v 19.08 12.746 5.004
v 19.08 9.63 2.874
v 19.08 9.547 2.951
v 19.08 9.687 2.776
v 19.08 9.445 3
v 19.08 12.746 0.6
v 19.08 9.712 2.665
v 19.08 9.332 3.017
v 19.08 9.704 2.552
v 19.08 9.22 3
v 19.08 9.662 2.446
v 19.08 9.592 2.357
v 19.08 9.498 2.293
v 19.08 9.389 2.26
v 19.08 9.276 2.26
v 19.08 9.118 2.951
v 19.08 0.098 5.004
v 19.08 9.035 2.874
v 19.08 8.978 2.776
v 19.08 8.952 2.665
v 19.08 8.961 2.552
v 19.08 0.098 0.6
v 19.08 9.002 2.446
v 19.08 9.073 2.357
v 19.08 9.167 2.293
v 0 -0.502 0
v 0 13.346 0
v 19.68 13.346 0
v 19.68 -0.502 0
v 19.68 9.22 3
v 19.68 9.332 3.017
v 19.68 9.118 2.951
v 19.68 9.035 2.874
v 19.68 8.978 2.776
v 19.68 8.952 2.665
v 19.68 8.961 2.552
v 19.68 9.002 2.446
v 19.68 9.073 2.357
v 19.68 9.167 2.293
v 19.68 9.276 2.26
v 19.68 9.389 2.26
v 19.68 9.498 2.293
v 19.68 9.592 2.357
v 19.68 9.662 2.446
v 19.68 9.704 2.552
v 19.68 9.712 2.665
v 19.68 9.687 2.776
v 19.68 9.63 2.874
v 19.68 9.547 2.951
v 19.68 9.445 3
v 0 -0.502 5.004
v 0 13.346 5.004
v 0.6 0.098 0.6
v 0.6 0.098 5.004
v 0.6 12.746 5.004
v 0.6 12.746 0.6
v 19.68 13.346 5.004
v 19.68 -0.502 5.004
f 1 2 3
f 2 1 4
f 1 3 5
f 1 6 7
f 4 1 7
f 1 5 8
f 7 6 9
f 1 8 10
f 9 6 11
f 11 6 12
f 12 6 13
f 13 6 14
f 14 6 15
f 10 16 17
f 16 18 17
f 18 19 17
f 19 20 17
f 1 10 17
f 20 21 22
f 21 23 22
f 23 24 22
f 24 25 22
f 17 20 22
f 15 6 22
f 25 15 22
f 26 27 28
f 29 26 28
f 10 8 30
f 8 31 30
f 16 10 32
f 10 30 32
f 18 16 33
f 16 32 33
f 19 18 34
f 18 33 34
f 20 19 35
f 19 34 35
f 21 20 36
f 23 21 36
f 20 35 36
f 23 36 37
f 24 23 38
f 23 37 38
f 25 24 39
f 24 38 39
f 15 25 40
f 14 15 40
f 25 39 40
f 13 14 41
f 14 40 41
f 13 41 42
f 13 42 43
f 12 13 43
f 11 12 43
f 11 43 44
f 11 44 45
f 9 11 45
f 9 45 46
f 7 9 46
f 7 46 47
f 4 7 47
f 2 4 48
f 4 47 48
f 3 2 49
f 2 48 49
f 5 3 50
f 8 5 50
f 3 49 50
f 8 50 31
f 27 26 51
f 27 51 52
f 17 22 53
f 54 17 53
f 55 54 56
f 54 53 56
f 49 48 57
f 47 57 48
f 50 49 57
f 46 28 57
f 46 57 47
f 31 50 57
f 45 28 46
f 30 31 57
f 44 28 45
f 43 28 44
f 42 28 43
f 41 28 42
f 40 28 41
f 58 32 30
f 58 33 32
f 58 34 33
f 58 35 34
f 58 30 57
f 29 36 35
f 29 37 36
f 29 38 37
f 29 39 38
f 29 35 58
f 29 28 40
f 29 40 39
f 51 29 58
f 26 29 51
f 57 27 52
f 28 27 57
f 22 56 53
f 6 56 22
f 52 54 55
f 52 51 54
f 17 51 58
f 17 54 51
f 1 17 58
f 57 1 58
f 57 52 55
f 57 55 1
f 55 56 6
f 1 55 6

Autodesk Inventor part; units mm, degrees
ref_plane "YZ Plane" through (0, 0, 0) normal (1, 0, 0) x (0, 1, 0)
ref_plane "XZ Plane" through (0, 0, 0) normal (0, 1, 0) x (-1, 0, 0)
ref_plane "XY Plane" through (0, 0, 0) normal (0, 0, 1) x (1, 0, 0)
sketch "Sketch1" plane through (0, 0, 0) normal (0, 0, 1) x (1, 0, 0)
  line L0 (0, 13.3457) -> (19.68, 13.3457)
  line L1 (19.68, 13.3457) -> (19.68, -0.5024)
  line L2 (19.68, -0.5024) -> (0, -0.5024)
  line L3 (0, -0.5024) -> (0, 13.3457)
  point P0 (0, 0)
extrude "Extrusion1" add sketch "Sketch1" along normal blind 5.0038
shell "Shell1" thickness 0.6 removed faces 1 at (6.56, 4.1137, 5.0038)
sketch "Sketch2" plane through (19.08, 0.0976, 0.6) normal (-1, 0, 0) x (0, 0, 1)
  point P0 (-0.6, -0.0976)
  point P1 (2.0364, 9.2348)
hole "Hole1" at (19.08, 9.3324, 2.6364) direction (1, 0, 0) diameter 0.762 end through all
properties part number "a1"
